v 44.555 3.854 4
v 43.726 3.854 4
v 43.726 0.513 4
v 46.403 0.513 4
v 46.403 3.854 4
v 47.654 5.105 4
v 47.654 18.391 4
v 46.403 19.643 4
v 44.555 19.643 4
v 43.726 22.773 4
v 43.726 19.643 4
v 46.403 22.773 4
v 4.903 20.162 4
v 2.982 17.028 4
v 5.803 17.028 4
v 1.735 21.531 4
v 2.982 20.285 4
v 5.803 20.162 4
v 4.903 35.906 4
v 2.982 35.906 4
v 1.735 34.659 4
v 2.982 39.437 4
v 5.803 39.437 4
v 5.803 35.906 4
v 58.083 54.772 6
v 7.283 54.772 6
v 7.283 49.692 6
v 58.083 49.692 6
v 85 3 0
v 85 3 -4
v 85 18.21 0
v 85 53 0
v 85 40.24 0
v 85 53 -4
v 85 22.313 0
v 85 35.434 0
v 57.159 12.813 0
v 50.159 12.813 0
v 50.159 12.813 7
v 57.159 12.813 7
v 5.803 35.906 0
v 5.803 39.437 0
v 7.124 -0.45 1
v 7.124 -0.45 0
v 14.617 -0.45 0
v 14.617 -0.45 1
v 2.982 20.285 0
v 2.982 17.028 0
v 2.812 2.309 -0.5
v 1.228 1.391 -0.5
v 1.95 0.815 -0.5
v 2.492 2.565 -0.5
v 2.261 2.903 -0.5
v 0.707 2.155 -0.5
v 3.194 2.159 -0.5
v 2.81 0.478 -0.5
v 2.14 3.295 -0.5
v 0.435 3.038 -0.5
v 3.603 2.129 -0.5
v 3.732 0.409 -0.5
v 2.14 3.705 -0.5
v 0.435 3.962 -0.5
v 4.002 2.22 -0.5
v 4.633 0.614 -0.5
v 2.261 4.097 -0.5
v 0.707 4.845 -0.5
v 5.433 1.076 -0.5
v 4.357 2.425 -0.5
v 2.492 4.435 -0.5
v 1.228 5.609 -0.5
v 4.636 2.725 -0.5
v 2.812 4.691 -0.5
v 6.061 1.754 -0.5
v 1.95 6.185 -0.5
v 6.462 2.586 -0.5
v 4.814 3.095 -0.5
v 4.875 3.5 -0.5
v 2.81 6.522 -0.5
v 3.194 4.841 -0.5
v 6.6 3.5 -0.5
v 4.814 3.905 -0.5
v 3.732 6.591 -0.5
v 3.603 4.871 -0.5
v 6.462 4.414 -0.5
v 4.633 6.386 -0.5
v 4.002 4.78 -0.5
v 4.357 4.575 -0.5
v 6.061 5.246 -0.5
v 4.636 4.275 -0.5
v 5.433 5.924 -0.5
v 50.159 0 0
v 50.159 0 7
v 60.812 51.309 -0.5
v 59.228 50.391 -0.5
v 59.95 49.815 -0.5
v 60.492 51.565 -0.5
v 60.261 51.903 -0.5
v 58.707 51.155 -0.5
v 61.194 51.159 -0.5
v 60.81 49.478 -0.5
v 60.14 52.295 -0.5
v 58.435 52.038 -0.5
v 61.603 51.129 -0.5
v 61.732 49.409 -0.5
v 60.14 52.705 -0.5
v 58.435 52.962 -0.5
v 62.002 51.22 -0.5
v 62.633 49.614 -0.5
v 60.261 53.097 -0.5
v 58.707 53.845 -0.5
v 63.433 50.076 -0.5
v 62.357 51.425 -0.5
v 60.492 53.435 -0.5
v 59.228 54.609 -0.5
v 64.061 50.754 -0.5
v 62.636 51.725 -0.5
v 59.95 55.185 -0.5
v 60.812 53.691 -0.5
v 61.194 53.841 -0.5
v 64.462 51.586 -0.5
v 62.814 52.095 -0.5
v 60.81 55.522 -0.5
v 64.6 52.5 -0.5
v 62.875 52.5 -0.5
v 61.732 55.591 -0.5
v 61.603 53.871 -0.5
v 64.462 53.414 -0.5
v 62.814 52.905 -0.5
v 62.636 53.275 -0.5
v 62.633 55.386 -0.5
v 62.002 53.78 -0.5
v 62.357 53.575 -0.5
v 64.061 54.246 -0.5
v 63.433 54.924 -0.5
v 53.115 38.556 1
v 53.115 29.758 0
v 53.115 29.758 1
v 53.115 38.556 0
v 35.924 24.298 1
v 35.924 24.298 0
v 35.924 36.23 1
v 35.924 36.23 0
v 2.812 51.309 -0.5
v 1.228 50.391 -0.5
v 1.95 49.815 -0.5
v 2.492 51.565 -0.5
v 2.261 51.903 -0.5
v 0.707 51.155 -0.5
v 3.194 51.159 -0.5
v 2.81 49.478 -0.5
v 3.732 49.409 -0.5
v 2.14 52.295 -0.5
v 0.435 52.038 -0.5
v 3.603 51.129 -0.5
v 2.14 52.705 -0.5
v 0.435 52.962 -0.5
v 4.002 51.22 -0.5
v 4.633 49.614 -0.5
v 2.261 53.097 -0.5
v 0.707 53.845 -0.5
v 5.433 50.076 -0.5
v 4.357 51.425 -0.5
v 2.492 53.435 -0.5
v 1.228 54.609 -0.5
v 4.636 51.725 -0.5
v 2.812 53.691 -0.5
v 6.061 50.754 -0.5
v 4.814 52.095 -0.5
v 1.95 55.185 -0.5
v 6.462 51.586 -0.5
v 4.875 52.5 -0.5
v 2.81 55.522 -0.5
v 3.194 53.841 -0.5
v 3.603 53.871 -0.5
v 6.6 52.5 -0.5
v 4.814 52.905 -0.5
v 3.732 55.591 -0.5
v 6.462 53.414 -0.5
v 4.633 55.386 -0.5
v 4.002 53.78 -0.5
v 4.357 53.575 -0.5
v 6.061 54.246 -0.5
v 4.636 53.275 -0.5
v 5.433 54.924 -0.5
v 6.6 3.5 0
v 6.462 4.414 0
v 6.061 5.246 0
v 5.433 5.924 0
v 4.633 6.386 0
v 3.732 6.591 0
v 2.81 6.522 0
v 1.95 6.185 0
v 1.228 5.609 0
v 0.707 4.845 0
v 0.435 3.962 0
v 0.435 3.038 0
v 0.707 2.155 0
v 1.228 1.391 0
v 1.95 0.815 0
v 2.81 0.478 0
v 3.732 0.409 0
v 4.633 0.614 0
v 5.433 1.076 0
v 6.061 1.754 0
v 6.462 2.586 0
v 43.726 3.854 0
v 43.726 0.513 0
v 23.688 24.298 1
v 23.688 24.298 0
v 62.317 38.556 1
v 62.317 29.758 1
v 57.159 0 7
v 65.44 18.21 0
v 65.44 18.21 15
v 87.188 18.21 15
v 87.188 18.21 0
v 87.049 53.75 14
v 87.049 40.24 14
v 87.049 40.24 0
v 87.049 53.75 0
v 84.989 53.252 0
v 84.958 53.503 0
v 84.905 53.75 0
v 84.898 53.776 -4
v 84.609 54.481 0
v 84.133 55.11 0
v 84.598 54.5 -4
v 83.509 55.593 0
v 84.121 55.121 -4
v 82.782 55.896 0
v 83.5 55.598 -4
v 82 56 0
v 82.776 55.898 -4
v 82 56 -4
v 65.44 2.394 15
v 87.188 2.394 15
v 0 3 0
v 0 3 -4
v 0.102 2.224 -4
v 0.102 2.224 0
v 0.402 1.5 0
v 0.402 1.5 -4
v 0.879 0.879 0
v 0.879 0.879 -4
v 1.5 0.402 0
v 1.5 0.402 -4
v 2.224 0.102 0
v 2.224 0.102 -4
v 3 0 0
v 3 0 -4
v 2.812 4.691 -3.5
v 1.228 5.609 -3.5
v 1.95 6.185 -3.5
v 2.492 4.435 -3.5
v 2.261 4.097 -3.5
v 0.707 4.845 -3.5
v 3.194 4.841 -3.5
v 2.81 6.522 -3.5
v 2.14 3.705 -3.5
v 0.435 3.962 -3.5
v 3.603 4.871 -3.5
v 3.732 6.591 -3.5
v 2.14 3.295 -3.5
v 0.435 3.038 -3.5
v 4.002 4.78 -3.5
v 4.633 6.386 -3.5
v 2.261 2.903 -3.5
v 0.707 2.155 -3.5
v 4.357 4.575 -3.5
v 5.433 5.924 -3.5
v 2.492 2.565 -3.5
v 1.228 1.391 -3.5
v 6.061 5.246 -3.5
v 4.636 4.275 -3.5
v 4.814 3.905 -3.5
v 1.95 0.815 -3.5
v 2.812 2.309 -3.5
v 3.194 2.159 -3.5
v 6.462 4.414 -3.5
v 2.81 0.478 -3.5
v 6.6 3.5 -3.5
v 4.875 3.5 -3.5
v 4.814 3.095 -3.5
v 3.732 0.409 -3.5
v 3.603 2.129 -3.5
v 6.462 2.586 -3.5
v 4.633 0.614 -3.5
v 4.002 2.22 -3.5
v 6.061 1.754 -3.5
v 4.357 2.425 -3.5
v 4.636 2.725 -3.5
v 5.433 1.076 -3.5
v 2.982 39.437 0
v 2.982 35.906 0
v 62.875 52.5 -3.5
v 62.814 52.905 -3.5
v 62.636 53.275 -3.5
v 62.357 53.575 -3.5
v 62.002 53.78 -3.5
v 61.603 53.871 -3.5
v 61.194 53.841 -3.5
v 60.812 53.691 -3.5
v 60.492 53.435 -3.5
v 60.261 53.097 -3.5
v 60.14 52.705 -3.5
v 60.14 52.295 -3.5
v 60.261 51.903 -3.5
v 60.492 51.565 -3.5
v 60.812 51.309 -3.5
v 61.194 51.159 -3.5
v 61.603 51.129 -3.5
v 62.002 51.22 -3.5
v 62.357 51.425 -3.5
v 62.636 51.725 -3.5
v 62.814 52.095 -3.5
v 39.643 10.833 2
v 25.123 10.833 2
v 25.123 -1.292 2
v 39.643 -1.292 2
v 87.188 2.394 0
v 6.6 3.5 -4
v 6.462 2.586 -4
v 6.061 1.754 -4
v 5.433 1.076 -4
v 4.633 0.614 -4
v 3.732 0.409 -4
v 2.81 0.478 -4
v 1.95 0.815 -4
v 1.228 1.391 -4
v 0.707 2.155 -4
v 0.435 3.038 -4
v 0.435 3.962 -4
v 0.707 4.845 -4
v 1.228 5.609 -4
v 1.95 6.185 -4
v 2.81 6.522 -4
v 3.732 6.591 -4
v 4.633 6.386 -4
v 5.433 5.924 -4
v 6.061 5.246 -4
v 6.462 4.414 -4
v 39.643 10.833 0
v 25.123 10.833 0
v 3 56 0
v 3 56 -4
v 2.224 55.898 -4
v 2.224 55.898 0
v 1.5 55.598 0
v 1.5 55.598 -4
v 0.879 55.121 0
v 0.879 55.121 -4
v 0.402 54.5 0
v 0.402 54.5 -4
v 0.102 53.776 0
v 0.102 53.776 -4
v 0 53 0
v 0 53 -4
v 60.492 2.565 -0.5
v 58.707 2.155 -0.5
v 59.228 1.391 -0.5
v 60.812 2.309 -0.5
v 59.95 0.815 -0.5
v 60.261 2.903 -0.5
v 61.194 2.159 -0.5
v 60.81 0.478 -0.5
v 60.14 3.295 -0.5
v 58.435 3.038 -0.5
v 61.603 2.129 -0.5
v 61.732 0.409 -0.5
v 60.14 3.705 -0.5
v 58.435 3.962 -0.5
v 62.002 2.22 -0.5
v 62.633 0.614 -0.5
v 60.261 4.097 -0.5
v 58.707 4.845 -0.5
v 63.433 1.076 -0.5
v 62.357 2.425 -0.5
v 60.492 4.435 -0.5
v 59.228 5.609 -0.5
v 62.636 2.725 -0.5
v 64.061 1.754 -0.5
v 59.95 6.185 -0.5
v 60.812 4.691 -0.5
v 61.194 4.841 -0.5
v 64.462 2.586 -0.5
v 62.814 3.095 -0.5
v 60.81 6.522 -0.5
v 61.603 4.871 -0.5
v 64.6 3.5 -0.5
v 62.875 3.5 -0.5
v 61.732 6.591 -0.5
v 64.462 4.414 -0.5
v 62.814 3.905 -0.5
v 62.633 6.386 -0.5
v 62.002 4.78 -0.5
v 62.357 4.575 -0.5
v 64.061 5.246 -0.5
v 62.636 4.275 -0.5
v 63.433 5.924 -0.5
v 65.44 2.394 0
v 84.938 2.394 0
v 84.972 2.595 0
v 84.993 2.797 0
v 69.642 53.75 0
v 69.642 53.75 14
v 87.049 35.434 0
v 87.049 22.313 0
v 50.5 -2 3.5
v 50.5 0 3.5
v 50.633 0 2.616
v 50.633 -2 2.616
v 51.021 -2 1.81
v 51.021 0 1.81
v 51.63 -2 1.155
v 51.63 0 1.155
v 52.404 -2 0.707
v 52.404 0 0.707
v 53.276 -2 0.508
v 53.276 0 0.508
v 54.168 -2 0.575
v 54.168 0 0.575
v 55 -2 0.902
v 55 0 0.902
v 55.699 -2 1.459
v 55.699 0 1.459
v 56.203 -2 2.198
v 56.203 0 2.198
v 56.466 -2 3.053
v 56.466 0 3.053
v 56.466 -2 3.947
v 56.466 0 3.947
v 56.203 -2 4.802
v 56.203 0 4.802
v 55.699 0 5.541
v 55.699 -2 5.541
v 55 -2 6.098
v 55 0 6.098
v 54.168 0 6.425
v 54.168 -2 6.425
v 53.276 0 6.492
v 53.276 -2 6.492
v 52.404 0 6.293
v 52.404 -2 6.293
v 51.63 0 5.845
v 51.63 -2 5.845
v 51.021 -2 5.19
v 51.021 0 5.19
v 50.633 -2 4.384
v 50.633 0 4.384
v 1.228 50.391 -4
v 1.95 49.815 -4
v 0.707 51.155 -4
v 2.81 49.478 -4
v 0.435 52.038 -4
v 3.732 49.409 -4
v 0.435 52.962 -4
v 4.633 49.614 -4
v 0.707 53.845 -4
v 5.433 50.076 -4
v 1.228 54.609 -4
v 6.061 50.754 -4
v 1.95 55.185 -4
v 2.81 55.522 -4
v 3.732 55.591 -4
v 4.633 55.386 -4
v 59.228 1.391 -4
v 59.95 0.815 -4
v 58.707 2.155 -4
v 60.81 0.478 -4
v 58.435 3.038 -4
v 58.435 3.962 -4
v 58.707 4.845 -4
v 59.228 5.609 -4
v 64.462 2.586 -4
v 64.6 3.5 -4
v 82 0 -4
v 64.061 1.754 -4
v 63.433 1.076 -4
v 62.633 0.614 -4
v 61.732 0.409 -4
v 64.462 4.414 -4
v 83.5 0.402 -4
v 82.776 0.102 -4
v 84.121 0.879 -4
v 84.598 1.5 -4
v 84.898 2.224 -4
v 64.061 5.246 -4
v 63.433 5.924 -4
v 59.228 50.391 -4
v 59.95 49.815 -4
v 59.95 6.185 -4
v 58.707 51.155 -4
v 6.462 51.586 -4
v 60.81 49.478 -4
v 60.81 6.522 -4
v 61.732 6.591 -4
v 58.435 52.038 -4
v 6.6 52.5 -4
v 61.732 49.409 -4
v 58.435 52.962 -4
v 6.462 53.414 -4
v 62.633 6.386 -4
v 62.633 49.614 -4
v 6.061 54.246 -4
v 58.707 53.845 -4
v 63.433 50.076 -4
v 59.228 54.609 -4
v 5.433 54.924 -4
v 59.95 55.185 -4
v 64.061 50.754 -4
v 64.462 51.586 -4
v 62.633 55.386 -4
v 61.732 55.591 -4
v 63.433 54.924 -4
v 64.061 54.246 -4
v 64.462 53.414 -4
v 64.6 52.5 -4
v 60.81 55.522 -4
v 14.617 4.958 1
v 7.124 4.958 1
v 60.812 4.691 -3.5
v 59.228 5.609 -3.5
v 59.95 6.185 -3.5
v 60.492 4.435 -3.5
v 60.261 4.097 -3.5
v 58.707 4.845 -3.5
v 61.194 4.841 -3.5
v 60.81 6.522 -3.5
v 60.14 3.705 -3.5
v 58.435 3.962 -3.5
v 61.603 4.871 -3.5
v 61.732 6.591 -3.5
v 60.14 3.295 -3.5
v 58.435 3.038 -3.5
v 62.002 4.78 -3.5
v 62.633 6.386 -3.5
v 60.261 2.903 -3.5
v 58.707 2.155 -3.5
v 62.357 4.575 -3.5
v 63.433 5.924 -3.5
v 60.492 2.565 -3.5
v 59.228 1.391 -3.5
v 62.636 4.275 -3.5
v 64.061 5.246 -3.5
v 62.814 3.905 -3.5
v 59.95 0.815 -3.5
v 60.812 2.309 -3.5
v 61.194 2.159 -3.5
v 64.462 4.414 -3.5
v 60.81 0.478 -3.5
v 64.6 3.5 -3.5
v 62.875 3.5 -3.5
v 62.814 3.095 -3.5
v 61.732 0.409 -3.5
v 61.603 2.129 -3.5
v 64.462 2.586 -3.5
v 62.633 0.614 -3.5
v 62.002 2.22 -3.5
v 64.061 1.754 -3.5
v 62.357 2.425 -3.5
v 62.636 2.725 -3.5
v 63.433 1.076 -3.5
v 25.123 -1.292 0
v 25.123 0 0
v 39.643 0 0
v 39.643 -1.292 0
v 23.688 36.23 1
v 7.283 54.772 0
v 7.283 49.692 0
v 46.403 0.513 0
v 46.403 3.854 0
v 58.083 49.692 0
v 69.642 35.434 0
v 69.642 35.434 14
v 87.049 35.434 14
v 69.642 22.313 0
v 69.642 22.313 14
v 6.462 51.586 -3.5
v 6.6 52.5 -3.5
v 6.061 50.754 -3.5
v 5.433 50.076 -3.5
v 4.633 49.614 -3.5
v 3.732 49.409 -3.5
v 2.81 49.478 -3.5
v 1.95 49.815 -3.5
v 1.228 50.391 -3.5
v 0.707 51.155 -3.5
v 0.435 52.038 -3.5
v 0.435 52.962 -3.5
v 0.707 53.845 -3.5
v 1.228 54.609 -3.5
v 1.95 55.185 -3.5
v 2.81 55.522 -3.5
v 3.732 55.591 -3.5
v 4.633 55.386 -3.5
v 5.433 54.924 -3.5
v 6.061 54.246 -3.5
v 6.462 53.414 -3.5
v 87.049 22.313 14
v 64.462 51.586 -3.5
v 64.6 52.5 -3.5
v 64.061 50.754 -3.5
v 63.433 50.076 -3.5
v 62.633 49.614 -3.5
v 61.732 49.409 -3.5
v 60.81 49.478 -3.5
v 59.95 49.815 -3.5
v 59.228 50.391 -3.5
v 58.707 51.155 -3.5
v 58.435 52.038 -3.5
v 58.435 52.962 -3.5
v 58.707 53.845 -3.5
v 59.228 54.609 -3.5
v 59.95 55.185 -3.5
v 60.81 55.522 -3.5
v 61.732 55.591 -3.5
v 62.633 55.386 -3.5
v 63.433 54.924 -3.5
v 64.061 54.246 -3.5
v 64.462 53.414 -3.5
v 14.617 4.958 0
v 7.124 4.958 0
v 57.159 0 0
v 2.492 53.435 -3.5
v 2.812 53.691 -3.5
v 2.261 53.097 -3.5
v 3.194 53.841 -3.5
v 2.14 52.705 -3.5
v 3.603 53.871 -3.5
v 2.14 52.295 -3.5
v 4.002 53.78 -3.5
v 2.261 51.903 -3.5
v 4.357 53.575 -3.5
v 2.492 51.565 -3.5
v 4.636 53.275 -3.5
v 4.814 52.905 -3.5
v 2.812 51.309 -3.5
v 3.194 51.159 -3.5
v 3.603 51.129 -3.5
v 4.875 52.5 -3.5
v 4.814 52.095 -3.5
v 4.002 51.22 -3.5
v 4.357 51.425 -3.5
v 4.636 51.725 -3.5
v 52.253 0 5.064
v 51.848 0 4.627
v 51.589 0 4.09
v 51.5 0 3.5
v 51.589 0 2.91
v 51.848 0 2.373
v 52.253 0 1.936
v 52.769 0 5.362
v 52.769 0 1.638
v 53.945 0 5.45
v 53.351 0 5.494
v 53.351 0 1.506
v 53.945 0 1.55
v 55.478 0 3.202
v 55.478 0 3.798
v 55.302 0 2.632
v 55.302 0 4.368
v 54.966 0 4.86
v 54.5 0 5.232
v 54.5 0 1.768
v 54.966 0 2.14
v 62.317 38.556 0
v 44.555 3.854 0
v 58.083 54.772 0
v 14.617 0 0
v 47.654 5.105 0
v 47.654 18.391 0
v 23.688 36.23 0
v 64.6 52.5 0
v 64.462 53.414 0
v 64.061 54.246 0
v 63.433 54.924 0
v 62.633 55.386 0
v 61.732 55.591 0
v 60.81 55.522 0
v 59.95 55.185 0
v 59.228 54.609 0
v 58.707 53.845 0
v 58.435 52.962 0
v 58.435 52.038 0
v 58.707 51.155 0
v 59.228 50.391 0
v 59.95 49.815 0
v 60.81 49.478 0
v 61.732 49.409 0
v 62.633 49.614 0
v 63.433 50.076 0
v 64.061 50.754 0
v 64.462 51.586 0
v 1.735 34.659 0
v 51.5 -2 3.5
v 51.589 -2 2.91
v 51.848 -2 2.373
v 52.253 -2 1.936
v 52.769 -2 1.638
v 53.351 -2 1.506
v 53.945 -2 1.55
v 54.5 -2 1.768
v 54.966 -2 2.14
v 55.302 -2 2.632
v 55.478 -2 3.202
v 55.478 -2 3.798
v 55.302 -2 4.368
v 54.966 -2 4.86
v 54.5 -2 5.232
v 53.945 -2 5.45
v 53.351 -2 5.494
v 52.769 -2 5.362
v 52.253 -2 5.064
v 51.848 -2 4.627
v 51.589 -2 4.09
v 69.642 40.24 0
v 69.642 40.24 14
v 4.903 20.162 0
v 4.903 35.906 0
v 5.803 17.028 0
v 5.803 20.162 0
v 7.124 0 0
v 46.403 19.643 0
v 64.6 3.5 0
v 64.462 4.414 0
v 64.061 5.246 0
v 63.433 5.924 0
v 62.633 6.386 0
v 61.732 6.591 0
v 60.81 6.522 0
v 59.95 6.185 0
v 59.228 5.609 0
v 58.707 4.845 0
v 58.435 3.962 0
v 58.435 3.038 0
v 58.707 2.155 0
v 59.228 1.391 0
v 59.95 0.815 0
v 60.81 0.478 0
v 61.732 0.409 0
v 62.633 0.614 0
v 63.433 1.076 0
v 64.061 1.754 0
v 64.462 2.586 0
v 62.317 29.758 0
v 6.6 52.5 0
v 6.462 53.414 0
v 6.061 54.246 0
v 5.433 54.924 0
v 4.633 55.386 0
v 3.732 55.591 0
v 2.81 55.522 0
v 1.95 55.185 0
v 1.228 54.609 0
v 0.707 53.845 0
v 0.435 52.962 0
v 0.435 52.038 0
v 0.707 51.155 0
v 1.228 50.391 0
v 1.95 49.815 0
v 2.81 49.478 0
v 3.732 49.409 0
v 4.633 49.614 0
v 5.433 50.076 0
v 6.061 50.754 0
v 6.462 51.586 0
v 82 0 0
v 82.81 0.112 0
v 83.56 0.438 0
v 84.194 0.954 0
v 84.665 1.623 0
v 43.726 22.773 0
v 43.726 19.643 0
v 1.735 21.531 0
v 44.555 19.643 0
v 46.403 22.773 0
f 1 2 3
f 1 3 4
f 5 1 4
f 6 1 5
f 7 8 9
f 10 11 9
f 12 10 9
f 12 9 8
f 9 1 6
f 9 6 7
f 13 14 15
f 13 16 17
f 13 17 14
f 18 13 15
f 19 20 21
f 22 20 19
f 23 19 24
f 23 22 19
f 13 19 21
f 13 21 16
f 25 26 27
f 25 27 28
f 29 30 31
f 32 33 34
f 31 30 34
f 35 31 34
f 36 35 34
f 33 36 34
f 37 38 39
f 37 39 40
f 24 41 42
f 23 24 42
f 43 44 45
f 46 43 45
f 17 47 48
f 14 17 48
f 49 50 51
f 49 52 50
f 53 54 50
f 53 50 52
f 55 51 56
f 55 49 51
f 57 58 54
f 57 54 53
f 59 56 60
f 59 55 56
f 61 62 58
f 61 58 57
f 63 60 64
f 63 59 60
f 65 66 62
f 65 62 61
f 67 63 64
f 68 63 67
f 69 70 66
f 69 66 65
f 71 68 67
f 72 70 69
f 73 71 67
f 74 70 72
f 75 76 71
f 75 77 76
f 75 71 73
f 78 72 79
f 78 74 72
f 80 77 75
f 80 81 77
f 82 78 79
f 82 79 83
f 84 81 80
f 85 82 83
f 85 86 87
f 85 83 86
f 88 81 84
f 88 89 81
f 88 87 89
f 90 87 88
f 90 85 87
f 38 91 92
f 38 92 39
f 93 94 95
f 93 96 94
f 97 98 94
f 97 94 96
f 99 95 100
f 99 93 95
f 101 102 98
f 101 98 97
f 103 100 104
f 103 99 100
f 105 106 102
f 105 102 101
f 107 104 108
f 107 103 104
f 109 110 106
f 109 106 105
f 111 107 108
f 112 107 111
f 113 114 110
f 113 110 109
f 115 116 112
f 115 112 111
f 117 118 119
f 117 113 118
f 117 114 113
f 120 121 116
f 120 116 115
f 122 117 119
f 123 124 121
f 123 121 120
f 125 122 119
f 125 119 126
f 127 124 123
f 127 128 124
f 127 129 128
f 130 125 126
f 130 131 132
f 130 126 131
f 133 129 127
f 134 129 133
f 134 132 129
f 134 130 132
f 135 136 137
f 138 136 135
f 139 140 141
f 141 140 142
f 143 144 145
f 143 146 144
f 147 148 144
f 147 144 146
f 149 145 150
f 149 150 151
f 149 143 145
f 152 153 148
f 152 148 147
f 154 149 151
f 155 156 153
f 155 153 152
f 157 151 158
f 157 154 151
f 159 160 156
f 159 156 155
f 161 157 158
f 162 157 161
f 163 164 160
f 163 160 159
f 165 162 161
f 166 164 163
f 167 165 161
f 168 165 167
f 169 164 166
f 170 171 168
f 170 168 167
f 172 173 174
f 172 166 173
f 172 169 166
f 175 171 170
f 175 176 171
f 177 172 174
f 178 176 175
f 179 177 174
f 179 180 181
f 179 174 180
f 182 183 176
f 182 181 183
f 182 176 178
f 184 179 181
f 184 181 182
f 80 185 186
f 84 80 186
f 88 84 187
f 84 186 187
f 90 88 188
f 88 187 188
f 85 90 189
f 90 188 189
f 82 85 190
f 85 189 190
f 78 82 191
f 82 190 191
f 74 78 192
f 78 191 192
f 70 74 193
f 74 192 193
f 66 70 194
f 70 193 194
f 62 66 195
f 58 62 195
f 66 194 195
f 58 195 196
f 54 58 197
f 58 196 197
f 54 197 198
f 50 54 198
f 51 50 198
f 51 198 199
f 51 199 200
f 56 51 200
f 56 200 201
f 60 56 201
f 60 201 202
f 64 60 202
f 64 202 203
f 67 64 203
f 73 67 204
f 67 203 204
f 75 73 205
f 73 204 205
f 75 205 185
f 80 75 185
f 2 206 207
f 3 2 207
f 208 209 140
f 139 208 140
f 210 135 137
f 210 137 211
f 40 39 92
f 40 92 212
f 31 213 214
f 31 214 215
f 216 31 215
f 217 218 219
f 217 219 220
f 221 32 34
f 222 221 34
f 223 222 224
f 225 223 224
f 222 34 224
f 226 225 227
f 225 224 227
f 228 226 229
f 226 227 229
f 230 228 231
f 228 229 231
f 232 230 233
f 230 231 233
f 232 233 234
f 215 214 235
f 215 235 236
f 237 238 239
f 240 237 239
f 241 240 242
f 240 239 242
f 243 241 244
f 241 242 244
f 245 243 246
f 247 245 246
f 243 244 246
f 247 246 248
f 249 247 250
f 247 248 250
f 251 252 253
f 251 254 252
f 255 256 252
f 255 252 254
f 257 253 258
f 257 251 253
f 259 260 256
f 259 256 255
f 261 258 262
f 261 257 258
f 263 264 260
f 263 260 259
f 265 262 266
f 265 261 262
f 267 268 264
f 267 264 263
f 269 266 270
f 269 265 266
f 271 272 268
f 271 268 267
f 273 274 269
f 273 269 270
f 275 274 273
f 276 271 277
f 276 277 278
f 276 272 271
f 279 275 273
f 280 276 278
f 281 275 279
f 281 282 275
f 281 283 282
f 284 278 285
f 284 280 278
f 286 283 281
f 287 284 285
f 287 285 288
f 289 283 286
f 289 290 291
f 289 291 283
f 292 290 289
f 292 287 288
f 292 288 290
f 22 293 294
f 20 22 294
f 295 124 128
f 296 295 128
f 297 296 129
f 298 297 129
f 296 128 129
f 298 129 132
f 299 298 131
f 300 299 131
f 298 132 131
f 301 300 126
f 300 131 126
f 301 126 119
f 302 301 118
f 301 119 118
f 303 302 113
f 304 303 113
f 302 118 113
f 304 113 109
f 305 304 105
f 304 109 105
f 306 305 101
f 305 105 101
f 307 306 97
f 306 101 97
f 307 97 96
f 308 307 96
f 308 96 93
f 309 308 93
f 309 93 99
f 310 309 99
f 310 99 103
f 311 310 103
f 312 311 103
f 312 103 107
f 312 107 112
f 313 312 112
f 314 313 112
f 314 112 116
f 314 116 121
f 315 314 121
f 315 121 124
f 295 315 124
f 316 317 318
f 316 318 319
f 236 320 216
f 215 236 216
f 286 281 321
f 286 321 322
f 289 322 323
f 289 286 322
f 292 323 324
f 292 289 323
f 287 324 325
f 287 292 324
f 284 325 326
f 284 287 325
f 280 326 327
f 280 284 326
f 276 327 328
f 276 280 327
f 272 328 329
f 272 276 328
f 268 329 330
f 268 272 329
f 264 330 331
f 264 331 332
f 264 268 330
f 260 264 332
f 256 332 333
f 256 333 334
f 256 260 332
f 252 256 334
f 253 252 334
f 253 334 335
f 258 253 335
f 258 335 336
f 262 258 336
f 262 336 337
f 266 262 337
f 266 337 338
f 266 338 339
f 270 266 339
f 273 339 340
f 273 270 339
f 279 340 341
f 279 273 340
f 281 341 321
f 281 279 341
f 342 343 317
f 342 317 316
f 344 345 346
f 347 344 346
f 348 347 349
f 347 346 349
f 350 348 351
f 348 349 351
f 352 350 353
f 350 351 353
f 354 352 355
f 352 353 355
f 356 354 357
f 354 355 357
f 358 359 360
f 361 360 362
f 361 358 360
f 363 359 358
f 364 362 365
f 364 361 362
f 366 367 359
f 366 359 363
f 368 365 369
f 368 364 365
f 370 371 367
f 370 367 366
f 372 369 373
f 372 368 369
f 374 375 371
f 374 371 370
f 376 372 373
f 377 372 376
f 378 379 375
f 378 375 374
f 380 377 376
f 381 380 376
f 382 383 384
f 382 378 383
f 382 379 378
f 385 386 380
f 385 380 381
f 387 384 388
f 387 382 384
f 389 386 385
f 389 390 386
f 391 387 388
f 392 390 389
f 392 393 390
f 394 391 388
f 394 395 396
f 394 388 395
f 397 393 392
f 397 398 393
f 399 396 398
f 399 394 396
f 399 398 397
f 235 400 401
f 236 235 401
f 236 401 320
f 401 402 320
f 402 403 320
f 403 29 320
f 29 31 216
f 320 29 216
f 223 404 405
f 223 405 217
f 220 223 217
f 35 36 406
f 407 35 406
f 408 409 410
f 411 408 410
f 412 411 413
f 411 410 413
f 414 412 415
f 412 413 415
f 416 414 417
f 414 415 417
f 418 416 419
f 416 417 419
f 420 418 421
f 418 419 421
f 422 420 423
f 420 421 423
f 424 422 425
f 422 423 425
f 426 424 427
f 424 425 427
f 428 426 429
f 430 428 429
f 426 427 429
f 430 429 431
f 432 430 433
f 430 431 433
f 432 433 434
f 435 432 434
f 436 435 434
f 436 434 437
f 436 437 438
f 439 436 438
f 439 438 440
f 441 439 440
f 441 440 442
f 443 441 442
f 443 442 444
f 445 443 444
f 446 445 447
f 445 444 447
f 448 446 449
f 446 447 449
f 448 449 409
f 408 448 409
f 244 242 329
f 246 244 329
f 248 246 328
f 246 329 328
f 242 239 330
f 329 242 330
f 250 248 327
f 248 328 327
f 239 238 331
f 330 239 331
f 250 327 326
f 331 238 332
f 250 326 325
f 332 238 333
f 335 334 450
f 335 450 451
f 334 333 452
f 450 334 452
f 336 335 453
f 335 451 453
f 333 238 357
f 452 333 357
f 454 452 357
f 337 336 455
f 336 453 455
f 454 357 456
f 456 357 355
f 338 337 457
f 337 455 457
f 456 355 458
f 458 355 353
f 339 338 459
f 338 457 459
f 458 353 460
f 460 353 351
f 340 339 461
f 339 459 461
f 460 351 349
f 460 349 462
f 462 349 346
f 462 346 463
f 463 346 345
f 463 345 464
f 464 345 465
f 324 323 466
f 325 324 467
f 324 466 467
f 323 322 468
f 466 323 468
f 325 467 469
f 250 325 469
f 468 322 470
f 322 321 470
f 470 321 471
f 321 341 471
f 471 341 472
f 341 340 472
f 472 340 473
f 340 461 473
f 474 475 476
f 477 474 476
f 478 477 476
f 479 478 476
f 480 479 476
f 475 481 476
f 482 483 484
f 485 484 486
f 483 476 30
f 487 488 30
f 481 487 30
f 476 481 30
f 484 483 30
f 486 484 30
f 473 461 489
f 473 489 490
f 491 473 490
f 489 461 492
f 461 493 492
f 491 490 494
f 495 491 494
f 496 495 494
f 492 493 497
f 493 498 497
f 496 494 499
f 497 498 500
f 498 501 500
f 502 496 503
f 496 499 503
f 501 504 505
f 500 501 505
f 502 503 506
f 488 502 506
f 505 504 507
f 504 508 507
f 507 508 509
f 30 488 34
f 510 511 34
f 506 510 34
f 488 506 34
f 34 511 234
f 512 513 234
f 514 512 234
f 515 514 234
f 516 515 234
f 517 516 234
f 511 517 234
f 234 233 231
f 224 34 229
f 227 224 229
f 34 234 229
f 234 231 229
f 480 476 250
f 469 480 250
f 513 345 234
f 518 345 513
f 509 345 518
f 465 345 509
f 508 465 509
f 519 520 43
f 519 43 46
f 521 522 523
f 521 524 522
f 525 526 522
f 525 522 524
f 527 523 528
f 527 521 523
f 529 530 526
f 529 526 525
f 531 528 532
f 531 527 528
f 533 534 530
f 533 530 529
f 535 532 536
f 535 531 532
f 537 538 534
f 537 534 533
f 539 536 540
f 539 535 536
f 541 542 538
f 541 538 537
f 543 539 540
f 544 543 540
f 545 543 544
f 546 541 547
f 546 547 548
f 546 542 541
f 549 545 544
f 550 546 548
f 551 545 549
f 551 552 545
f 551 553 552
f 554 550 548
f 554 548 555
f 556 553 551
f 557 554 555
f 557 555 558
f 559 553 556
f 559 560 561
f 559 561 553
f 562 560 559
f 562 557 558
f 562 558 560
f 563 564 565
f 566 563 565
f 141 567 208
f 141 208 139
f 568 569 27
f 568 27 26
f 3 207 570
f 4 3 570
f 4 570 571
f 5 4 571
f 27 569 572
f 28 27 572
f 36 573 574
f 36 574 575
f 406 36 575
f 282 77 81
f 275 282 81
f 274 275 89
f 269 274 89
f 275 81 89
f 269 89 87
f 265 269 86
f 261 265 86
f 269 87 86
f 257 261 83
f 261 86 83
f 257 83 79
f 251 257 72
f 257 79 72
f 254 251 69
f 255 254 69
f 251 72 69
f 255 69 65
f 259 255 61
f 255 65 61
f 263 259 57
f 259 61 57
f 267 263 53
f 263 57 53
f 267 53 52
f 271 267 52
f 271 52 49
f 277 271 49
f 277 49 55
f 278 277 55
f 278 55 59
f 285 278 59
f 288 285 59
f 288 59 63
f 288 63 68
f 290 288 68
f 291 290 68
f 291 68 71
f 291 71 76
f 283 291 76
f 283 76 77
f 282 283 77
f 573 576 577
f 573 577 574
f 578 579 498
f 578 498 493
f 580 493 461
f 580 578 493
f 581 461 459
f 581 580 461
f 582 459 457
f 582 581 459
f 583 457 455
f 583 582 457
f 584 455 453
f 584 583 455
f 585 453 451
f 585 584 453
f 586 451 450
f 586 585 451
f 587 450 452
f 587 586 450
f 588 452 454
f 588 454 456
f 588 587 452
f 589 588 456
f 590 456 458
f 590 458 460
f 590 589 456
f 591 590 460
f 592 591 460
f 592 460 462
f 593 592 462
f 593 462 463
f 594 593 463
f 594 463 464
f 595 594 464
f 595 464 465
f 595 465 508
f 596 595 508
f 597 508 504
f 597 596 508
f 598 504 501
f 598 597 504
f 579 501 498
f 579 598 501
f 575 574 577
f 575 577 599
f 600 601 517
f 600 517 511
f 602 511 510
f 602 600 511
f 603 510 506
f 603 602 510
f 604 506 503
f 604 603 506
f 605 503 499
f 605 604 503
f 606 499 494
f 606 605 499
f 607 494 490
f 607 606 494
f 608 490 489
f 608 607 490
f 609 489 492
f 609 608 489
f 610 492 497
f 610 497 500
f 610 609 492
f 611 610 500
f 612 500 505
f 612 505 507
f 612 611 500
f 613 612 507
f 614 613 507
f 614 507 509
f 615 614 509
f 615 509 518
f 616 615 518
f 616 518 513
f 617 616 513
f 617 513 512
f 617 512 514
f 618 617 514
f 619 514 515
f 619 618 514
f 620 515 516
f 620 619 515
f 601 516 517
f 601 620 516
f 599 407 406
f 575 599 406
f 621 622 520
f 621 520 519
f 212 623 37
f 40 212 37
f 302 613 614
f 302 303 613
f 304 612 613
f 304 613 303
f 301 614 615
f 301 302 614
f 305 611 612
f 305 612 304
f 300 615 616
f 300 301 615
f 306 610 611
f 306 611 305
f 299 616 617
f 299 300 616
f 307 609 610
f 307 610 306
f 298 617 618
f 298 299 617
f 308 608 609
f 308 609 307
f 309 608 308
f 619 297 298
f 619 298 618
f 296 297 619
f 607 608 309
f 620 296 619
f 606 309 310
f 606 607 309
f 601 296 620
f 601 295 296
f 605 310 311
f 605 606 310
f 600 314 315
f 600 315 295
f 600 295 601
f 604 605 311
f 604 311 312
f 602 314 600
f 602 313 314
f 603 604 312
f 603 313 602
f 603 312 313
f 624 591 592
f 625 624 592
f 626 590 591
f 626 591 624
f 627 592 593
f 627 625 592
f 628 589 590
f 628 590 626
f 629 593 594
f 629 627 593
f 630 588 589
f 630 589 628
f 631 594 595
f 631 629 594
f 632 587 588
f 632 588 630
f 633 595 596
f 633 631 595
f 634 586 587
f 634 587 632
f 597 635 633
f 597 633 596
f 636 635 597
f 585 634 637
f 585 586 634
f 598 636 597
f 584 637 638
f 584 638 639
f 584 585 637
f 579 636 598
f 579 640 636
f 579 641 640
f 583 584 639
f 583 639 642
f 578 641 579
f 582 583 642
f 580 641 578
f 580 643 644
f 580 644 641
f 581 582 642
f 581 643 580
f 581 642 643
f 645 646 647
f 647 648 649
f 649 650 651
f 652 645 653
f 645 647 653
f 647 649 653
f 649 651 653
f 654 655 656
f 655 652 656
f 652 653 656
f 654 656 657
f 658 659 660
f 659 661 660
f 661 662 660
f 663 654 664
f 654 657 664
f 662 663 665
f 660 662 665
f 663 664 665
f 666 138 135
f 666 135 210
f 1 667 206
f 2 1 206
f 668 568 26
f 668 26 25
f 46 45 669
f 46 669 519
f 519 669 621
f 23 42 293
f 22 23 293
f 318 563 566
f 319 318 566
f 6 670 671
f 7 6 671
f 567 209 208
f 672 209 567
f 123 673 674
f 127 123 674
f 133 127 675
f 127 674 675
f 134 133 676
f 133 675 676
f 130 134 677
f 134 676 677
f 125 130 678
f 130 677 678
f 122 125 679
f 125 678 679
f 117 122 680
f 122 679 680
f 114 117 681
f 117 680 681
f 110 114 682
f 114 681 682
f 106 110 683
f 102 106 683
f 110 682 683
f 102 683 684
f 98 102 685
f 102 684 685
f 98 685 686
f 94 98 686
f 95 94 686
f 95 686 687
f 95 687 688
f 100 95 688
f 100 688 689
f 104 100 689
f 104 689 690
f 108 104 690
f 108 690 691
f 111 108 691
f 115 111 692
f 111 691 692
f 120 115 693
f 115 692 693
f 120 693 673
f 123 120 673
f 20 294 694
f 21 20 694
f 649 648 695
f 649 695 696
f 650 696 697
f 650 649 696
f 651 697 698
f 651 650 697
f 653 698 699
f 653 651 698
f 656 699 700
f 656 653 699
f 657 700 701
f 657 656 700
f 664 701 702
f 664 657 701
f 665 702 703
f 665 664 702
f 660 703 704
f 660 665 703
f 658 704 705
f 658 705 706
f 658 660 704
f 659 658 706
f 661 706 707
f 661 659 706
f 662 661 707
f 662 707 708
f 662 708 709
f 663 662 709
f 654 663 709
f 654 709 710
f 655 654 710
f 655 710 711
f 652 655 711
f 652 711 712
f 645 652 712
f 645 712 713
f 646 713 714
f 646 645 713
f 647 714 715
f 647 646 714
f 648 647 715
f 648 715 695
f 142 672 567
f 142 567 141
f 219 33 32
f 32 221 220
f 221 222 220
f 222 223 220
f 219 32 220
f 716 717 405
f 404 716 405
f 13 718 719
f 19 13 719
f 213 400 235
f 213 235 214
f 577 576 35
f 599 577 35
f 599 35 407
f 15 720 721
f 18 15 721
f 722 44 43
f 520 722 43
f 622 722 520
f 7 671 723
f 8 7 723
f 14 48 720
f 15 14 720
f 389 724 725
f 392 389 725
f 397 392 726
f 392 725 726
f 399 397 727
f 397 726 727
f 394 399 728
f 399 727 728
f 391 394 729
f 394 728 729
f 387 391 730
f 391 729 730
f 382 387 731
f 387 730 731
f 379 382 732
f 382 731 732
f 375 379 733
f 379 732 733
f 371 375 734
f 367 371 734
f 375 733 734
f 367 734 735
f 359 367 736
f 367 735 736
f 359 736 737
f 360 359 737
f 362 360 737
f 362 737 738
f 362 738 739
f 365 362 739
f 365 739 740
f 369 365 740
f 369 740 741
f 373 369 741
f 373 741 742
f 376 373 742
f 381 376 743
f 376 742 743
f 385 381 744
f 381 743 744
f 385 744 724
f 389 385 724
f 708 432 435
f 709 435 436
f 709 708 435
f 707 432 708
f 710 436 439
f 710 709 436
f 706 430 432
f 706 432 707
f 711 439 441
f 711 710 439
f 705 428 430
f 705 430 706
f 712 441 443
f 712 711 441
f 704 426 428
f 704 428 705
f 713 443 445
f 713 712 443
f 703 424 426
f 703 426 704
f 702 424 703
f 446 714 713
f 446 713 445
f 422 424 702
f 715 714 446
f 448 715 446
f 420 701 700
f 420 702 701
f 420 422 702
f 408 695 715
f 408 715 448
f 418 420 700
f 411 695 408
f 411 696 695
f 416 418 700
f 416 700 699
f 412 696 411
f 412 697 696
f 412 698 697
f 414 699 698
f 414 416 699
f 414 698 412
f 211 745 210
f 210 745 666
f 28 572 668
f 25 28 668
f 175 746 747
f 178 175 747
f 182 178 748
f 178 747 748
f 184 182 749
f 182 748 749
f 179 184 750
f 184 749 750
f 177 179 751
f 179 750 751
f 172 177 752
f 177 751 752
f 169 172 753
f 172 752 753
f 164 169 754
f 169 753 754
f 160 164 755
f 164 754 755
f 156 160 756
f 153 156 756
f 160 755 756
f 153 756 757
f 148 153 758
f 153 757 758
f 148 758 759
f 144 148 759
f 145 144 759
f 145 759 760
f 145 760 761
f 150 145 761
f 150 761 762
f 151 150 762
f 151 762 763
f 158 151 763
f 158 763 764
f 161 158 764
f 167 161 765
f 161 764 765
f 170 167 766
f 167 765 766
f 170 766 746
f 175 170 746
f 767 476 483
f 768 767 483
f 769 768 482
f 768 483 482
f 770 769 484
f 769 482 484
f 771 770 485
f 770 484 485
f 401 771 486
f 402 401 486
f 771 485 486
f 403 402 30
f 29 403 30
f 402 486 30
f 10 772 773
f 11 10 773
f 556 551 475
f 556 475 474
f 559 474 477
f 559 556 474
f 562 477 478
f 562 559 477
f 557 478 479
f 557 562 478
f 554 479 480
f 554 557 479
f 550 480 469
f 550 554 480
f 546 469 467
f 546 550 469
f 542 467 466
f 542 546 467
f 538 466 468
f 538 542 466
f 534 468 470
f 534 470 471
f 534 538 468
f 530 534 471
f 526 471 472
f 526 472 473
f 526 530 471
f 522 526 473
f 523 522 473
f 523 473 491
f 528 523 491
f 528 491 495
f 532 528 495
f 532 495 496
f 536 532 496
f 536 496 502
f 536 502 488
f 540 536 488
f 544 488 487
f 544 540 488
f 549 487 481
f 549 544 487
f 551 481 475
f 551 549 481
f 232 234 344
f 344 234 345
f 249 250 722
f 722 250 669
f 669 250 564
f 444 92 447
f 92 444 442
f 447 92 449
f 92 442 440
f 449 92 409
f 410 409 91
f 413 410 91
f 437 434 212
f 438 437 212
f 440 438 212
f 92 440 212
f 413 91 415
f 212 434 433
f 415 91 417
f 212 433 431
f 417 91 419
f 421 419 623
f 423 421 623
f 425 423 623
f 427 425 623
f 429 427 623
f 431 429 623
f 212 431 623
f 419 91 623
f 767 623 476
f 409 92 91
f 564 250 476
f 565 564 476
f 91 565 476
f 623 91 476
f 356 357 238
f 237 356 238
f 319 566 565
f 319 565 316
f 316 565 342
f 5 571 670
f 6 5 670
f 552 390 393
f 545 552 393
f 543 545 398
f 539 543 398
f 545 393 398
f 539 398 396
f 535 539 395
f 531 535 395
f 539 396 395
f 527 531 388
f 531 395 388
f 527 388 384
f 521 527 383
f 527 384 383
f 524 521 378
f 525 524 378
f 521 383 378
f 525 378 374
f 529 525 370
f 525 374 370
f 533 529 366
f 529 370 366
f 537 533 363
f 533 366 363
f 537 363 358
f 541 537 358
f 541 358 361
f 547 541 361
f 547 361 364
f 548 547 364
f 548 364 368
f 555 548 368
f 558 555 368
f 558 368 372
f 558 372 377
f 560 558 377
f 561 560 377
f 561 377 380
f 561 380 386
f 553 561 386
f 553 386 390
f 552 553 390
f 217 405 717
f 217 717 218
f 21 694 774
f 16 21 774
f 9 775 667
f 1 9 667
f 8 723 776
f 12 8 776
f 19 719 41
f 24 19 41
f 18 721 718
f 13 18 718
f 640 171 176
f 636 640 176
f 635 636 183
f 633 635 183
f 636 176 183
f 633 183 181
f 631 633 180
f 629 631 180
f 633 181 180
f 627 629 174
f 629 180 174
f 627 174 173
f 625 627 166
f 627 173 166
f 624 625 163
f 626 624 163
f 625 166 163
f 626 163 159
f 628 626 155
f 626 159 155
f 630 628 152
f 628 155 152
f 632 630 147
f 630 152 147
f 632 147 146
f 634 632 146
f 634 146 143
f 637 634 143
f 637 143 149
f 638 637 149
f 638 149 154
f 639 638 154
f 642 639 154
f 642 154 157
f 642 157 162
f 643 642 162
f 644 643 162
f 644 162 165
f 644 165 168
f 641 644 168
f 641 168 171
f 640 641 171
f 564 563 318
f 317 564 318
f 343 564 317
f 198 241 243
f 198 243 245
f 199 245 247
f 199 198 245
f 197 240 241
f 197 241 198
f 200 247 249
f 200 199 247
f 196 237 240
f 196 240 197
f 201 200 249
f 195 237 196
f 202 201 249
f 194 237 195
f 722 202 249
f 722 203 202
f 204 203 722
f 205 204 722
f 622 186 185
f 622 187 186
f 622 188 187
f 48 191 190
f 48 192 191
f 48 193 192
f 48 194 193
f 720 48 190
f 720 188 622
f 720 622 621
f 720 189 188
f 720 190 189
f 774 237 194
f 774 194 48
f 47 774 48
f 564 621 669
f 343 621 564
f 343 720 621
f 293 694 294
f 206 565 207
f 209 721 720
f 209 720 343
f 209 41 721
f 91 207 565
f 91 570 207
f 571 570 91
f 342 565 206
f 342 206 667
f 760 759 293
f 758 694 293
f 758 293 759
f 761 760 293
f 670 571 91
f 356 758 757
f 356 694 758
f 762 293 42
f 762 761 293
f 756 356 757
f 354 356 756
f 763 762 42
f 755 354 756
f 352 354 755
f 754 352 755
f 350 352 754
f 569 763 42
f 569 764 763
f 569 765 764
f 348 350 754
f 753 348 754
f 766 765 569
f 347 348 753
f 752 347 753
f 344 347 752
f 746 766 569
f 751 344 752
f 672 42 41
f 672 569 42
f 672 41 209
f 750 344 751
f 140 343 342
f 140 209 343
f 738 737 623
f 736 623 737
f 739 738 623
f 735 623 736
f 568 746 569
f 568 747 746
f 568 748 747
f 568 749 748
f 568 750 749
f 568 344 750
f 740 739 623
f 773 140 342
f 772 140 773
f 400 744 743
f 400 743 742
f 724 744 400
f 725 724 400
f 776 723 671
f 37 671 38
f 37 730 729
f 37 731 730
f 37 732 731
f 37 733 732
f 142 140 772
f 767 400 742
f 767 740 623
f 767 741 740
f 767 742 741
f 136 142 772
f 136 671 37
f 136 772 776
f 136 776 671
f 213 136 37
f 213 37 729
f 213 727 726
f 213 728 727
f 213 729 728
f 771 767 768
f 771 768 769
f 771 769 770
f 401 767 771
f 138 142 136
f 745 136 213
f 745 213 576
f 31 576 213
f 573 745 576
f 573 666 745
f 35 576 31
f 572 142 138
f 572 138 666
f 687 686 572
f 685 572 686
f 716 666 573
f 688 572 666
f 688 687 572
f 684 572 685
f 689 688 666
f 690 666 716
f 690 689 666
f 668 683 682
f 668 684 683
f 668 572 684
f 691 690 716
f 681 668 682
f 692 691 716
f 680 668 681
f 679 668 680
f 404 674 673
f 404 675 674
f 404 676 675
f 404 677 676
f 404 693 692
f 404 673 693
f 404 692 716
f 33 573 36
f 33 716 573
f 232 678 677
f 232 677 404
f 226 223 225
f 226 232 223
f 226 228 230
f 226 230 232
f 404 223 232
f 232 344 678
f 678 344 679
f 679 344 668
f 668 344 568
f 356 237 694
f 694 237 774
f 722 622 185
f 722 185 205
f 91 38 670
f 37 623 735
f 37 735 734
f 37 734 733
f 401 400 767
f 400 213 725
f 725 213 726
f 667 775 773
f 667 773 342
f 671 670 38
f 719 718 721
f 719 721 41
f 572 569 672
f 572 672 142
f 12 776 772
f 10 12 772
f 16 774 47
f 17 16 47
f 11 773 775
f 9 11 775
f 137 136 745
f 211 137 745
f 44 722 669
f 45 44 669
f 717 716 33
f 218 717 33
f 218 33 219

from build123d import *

# Parameters (mm, degrees)
EXTRUDE_START       = -4
EXTRUDE_2_DEPTH     = 4
SKETCH_2_R          = 3.1
CUT_EXTRUDE_1_DEPTH = 0.5
SKETCH_3_R          = 1.375
CUT_EXTRUDE_2_DEPTH = 4
SKETCH_4_W          = 50.8
SKETCH_4_H          = 5.08
EXTRUDE_3_DEPTH     = 6
SKETCH_5_W          = 12.235874624
SKETCH_5_H          = 11.932505832
EXTRUDE_4_DEPTH     = 1
SKETCH_6_W          = 17.407120639
SKETCH_6_H          = 13.510004078
SKETCH_6_H_2        = 13.120292422
EXTRUDE_5_DEPTH     = 14
SKETCH_7_W          = 21.748003317
SKETCH_7_H          = 15.815488158
EXTRUDE_6_DEPTH     = 15
SKETCH_8_W          = 9.2021867
SKETCH_8_H          = 8.797694978
EXTRUDE_7_DEPTH     = 1
SKETCH_9_W          = 14.519457286
SKETCH_9_H          = 12.125029798
EXTRUDE_8_DEPTH     = 2
SKETCH_10_W         = 7
SKETCH_10_H         = 12.812960392
EXTRUDE_9_DEPTH     = 7
SKETCH_11_R         = 3
SKETCH_11_R_2       = 2
EXTRUDE_1_DEPTH     = 2
EXTRUDE_10_DEPTH    = 4
SKETCH_13_W         = 7.492652901
SKETCH_13_H         = 5.40798094
EXTRUDE_11_DEPTH    = 1
EXTRUDE_12_DEPTH    = 4
CUT_EXTRUDE_START   = -0.5
SKETCH_15_R         = 3.1
CUT_EXTRUDE_3_DEPTH = 0.5


# Read off the part's stored shape, not the designer's step: 凸台-拉伸2
with BuildPart() as part:
    # 凸台-拉伸2 outline → 凸台-拉伸2 (new body)
    with BuildSketch(Plane.XY.offset(EXTRUDE_START)):
        with BuildLine():
            ThreePointArc((3, 56), (0.878679656, 55.121320344), (0, 53))
            Line((0, 53), (0, 3))
            ThreePointArc((0, 3), (0.878679656, 0.878679656), (3, 0))
            Line((3, 0), (82, 0))
            ThreePointArc((82, 0), (84.121320344, 0.878679656), (85, 3))
            Line((85, 3), (85, 53))
            ThreePointArc((85, 53), (84.121320344, 55.121320344), (82, 56))
            Line((82, 56), (3, 56))
        make_face()
    extrude(amount=EXTRUDE_2_DEPTH)

    # 草图2 → 切除-拉伸1 (cut)
    with BuildSketch(Plane.XY):
        with Locations((3.5, 3.5)):
            Circle(SKETCH_2_R)
        with Locations((61.5, 3.5)):
            Circle(SKETCH_2_R)
        with Locations((3.5, 52.5)):
            Circle(SKETCH_2_R)
        with Locations((61.5, 52.5)):
            Circle(SKETCH_2_R)
    extrude(amount=-CUT_EXTRUDE_1_DEPTH, mode=Mode.SUBTRACT)

    # 草图3 → 切除-拉伸2 (cut)
    with BuildSketch(Plane.XY):
        with Locations((3.5, 52.5)):
            Circle(SKETCH_3_R)
        with Locations((61.5, 52.5)):
            Circle(SKETCH_3_R)
        with Locations((3.5, 3.5)):
            Circle(SKETCH_3_R)
        with Locations((61.5, 3.5)):
            Circle(SKETCH_3_R)
    extrude(amount=-CUT_EXTRUDE_2_DEPTH, mode=Mode.SUBTRACT)

    # 草图4 → 凸台-拉伸3 (add)
    with BuildSketch(Plane.XY):
        with Locations((32.682745254, 52.232035351)):
            Rectangle(SKETCH_4_W, SKETCH_4_H)
    extrude(amount=EXTRUDE_3_DEPTH)

    # 草图5 → 凸台-拉伸4 (add)
    with BuildSketch(Plane.XY):
        with Locations((29.806273598, 30.264010216)):
            Rectangle(SKETCH_5_W, SKETCH_5_H)
    extrude(amount=EXTRUDE_4_DEPTH)

    # 草图6 → 凸台-拉伸5 (add)
    with BuildSketch(Plane.XY):
        with Locations((78.345183612, 46.994971673)):
            Rectangle(SKETCH_6_W, SKETCH_6_H)
        with Locations((78.345183612, 28.873379664)):
            Rectangle(SKETCH_6_W, SKETCH_6_H_2)
    extrude(amount=EXTRUDE_5_DEPTH)

    # 草图7 → 凸台-拉伸6 (add)
    with BuildSketch(Plane.XY):
        with Locations((76.314084713, 10.301990913)):
            Rectangle(SKETCH_7_W, SKETCH_7_H)
    extrude(amount=EXTRUDE_6_DEPTH)

    # 草图8 → 凸台-拉伸7 (add)
    with BuildSketch(Plane.XY):
        with Locations((57.716202493, 34.157243051)):
            Rectangle(SKETCH_8_W, SKETCH_8_H)
    extrude(amount=EXTRUDE_7_DEPTH)

    # 草图9 → 凸台-拉伸8 (add)
    with BuildSketch(Plane.XY):
        with Locations((32.383118315, 4.770804671)):
            Rectangle(SKETCH_9_W, SKETCH_9_H)
    extrude(amount=EXTRUDE_8_DEPTH)

    # 草图10 → 凸台-拉伸9 (add)
    with BuildSketch(Plane.XY):
        with Locations((53.659033893, 6.406480196)):
            Rectangle(SKETCH_10_W, SKETCH_10_H)
    extrude(amount=EXTRUDE_9_DEPTH)

    # 草图11 → 拉伸-薄壁1 (add)
    with BuildSketch(Plane(origin=(0, 0, 0), x_dir=(-1, 0, 0), z_dir=(0, -1, 0))):
        with Locations((-53.5, -3.5)):
            Circle(SKETCH_11_R)
        with Locations((-53.5, -3.5)):
            Circle(SKETCH_11_R_2, mode=Mode.SUBTRACT)
    extrude(amount=EXTRUDE_1_DEPTH)

    # 草图12 → 凸台-拉伸10 (add)
    with BuildSketch(Plane.XY):
        Polygon((43.726404027, 3.853526794), (43.726404027, 0.513143902), (46.402655395, 0.513143902), (46.402655395, 3.853526794), (47.65405595, 5.104927349), (47.65405595, 18.391456575), (46.402655395, 19.64285713), (46.402655395, 22.77278121), (43.726404027, 22.77278121), (43.726404027, 19.64285713), (44.555447726, 19.64285713), (44.555447726, 3.853526794), align=None)
    extrude(amount=EXTRUDE_10_DEPTH)

    # 草图13 → 凸台-拉伸11 (add)
    with BuildSketch(Plane.XY):
        with Locations((10.870809128, 2.254112914)):
            Rectangle(SKETCH_13_W, SKETCH_13_H)
    extrude(amount=EXTRUDE_11_DEPTH)

    # 草图14 → 凸台-拉伸12 (add)
    with BuildSketch(Plane.XY):
        Polygon((2.981536039, 17.027603439), (5.803149545, 17.027603439), (5.803149545, 20.162023057), (4.903155557, 20.162023057), (4.903155557, 35.905554668), (5.803149545, 35.905554668), (5.803149545, 39.436558403), (2.981536039, 39.436558403), (2.981536039, 35.905554668), (1.735405071, 34.659423699), (1.735405071, 21.530793828), (2.981536039, 20.28466286), align=None)
    extrude(amount=EXTRUDE_12_DEPTH)

    # 草图15 → 切除-拉伸3 (cut)
    with BuildSketch(Plane(origin=(0, 0, -4), x_dir=(-1, 0, 0), z_dir=(0, 0, -1)).offset(CUT_EXTRUDE_START)):
        with Locations(Location((-61.5, 52.5, 0), (0, 0, 180))):
            Circle(SKETCH_15_R)
        with Locations(Location((-61.5, 3.5, 0), (0, 0, 180))):
            Circle(SKETCH_15_R)
        with Locations(Location((-3.5, 52.5, 0), (0, 0, 180))):
            Circle(SKETCH_15_R)
        with Locations(Location((-3.5, 3.5, 0), (0, 0, 180))):
            Circle(SKETCH_15_R)
    extrude(amount=CUT_EXTRUDE_3_DEPTH, mode=Mode.SUBTRACT)


solid = part.part
